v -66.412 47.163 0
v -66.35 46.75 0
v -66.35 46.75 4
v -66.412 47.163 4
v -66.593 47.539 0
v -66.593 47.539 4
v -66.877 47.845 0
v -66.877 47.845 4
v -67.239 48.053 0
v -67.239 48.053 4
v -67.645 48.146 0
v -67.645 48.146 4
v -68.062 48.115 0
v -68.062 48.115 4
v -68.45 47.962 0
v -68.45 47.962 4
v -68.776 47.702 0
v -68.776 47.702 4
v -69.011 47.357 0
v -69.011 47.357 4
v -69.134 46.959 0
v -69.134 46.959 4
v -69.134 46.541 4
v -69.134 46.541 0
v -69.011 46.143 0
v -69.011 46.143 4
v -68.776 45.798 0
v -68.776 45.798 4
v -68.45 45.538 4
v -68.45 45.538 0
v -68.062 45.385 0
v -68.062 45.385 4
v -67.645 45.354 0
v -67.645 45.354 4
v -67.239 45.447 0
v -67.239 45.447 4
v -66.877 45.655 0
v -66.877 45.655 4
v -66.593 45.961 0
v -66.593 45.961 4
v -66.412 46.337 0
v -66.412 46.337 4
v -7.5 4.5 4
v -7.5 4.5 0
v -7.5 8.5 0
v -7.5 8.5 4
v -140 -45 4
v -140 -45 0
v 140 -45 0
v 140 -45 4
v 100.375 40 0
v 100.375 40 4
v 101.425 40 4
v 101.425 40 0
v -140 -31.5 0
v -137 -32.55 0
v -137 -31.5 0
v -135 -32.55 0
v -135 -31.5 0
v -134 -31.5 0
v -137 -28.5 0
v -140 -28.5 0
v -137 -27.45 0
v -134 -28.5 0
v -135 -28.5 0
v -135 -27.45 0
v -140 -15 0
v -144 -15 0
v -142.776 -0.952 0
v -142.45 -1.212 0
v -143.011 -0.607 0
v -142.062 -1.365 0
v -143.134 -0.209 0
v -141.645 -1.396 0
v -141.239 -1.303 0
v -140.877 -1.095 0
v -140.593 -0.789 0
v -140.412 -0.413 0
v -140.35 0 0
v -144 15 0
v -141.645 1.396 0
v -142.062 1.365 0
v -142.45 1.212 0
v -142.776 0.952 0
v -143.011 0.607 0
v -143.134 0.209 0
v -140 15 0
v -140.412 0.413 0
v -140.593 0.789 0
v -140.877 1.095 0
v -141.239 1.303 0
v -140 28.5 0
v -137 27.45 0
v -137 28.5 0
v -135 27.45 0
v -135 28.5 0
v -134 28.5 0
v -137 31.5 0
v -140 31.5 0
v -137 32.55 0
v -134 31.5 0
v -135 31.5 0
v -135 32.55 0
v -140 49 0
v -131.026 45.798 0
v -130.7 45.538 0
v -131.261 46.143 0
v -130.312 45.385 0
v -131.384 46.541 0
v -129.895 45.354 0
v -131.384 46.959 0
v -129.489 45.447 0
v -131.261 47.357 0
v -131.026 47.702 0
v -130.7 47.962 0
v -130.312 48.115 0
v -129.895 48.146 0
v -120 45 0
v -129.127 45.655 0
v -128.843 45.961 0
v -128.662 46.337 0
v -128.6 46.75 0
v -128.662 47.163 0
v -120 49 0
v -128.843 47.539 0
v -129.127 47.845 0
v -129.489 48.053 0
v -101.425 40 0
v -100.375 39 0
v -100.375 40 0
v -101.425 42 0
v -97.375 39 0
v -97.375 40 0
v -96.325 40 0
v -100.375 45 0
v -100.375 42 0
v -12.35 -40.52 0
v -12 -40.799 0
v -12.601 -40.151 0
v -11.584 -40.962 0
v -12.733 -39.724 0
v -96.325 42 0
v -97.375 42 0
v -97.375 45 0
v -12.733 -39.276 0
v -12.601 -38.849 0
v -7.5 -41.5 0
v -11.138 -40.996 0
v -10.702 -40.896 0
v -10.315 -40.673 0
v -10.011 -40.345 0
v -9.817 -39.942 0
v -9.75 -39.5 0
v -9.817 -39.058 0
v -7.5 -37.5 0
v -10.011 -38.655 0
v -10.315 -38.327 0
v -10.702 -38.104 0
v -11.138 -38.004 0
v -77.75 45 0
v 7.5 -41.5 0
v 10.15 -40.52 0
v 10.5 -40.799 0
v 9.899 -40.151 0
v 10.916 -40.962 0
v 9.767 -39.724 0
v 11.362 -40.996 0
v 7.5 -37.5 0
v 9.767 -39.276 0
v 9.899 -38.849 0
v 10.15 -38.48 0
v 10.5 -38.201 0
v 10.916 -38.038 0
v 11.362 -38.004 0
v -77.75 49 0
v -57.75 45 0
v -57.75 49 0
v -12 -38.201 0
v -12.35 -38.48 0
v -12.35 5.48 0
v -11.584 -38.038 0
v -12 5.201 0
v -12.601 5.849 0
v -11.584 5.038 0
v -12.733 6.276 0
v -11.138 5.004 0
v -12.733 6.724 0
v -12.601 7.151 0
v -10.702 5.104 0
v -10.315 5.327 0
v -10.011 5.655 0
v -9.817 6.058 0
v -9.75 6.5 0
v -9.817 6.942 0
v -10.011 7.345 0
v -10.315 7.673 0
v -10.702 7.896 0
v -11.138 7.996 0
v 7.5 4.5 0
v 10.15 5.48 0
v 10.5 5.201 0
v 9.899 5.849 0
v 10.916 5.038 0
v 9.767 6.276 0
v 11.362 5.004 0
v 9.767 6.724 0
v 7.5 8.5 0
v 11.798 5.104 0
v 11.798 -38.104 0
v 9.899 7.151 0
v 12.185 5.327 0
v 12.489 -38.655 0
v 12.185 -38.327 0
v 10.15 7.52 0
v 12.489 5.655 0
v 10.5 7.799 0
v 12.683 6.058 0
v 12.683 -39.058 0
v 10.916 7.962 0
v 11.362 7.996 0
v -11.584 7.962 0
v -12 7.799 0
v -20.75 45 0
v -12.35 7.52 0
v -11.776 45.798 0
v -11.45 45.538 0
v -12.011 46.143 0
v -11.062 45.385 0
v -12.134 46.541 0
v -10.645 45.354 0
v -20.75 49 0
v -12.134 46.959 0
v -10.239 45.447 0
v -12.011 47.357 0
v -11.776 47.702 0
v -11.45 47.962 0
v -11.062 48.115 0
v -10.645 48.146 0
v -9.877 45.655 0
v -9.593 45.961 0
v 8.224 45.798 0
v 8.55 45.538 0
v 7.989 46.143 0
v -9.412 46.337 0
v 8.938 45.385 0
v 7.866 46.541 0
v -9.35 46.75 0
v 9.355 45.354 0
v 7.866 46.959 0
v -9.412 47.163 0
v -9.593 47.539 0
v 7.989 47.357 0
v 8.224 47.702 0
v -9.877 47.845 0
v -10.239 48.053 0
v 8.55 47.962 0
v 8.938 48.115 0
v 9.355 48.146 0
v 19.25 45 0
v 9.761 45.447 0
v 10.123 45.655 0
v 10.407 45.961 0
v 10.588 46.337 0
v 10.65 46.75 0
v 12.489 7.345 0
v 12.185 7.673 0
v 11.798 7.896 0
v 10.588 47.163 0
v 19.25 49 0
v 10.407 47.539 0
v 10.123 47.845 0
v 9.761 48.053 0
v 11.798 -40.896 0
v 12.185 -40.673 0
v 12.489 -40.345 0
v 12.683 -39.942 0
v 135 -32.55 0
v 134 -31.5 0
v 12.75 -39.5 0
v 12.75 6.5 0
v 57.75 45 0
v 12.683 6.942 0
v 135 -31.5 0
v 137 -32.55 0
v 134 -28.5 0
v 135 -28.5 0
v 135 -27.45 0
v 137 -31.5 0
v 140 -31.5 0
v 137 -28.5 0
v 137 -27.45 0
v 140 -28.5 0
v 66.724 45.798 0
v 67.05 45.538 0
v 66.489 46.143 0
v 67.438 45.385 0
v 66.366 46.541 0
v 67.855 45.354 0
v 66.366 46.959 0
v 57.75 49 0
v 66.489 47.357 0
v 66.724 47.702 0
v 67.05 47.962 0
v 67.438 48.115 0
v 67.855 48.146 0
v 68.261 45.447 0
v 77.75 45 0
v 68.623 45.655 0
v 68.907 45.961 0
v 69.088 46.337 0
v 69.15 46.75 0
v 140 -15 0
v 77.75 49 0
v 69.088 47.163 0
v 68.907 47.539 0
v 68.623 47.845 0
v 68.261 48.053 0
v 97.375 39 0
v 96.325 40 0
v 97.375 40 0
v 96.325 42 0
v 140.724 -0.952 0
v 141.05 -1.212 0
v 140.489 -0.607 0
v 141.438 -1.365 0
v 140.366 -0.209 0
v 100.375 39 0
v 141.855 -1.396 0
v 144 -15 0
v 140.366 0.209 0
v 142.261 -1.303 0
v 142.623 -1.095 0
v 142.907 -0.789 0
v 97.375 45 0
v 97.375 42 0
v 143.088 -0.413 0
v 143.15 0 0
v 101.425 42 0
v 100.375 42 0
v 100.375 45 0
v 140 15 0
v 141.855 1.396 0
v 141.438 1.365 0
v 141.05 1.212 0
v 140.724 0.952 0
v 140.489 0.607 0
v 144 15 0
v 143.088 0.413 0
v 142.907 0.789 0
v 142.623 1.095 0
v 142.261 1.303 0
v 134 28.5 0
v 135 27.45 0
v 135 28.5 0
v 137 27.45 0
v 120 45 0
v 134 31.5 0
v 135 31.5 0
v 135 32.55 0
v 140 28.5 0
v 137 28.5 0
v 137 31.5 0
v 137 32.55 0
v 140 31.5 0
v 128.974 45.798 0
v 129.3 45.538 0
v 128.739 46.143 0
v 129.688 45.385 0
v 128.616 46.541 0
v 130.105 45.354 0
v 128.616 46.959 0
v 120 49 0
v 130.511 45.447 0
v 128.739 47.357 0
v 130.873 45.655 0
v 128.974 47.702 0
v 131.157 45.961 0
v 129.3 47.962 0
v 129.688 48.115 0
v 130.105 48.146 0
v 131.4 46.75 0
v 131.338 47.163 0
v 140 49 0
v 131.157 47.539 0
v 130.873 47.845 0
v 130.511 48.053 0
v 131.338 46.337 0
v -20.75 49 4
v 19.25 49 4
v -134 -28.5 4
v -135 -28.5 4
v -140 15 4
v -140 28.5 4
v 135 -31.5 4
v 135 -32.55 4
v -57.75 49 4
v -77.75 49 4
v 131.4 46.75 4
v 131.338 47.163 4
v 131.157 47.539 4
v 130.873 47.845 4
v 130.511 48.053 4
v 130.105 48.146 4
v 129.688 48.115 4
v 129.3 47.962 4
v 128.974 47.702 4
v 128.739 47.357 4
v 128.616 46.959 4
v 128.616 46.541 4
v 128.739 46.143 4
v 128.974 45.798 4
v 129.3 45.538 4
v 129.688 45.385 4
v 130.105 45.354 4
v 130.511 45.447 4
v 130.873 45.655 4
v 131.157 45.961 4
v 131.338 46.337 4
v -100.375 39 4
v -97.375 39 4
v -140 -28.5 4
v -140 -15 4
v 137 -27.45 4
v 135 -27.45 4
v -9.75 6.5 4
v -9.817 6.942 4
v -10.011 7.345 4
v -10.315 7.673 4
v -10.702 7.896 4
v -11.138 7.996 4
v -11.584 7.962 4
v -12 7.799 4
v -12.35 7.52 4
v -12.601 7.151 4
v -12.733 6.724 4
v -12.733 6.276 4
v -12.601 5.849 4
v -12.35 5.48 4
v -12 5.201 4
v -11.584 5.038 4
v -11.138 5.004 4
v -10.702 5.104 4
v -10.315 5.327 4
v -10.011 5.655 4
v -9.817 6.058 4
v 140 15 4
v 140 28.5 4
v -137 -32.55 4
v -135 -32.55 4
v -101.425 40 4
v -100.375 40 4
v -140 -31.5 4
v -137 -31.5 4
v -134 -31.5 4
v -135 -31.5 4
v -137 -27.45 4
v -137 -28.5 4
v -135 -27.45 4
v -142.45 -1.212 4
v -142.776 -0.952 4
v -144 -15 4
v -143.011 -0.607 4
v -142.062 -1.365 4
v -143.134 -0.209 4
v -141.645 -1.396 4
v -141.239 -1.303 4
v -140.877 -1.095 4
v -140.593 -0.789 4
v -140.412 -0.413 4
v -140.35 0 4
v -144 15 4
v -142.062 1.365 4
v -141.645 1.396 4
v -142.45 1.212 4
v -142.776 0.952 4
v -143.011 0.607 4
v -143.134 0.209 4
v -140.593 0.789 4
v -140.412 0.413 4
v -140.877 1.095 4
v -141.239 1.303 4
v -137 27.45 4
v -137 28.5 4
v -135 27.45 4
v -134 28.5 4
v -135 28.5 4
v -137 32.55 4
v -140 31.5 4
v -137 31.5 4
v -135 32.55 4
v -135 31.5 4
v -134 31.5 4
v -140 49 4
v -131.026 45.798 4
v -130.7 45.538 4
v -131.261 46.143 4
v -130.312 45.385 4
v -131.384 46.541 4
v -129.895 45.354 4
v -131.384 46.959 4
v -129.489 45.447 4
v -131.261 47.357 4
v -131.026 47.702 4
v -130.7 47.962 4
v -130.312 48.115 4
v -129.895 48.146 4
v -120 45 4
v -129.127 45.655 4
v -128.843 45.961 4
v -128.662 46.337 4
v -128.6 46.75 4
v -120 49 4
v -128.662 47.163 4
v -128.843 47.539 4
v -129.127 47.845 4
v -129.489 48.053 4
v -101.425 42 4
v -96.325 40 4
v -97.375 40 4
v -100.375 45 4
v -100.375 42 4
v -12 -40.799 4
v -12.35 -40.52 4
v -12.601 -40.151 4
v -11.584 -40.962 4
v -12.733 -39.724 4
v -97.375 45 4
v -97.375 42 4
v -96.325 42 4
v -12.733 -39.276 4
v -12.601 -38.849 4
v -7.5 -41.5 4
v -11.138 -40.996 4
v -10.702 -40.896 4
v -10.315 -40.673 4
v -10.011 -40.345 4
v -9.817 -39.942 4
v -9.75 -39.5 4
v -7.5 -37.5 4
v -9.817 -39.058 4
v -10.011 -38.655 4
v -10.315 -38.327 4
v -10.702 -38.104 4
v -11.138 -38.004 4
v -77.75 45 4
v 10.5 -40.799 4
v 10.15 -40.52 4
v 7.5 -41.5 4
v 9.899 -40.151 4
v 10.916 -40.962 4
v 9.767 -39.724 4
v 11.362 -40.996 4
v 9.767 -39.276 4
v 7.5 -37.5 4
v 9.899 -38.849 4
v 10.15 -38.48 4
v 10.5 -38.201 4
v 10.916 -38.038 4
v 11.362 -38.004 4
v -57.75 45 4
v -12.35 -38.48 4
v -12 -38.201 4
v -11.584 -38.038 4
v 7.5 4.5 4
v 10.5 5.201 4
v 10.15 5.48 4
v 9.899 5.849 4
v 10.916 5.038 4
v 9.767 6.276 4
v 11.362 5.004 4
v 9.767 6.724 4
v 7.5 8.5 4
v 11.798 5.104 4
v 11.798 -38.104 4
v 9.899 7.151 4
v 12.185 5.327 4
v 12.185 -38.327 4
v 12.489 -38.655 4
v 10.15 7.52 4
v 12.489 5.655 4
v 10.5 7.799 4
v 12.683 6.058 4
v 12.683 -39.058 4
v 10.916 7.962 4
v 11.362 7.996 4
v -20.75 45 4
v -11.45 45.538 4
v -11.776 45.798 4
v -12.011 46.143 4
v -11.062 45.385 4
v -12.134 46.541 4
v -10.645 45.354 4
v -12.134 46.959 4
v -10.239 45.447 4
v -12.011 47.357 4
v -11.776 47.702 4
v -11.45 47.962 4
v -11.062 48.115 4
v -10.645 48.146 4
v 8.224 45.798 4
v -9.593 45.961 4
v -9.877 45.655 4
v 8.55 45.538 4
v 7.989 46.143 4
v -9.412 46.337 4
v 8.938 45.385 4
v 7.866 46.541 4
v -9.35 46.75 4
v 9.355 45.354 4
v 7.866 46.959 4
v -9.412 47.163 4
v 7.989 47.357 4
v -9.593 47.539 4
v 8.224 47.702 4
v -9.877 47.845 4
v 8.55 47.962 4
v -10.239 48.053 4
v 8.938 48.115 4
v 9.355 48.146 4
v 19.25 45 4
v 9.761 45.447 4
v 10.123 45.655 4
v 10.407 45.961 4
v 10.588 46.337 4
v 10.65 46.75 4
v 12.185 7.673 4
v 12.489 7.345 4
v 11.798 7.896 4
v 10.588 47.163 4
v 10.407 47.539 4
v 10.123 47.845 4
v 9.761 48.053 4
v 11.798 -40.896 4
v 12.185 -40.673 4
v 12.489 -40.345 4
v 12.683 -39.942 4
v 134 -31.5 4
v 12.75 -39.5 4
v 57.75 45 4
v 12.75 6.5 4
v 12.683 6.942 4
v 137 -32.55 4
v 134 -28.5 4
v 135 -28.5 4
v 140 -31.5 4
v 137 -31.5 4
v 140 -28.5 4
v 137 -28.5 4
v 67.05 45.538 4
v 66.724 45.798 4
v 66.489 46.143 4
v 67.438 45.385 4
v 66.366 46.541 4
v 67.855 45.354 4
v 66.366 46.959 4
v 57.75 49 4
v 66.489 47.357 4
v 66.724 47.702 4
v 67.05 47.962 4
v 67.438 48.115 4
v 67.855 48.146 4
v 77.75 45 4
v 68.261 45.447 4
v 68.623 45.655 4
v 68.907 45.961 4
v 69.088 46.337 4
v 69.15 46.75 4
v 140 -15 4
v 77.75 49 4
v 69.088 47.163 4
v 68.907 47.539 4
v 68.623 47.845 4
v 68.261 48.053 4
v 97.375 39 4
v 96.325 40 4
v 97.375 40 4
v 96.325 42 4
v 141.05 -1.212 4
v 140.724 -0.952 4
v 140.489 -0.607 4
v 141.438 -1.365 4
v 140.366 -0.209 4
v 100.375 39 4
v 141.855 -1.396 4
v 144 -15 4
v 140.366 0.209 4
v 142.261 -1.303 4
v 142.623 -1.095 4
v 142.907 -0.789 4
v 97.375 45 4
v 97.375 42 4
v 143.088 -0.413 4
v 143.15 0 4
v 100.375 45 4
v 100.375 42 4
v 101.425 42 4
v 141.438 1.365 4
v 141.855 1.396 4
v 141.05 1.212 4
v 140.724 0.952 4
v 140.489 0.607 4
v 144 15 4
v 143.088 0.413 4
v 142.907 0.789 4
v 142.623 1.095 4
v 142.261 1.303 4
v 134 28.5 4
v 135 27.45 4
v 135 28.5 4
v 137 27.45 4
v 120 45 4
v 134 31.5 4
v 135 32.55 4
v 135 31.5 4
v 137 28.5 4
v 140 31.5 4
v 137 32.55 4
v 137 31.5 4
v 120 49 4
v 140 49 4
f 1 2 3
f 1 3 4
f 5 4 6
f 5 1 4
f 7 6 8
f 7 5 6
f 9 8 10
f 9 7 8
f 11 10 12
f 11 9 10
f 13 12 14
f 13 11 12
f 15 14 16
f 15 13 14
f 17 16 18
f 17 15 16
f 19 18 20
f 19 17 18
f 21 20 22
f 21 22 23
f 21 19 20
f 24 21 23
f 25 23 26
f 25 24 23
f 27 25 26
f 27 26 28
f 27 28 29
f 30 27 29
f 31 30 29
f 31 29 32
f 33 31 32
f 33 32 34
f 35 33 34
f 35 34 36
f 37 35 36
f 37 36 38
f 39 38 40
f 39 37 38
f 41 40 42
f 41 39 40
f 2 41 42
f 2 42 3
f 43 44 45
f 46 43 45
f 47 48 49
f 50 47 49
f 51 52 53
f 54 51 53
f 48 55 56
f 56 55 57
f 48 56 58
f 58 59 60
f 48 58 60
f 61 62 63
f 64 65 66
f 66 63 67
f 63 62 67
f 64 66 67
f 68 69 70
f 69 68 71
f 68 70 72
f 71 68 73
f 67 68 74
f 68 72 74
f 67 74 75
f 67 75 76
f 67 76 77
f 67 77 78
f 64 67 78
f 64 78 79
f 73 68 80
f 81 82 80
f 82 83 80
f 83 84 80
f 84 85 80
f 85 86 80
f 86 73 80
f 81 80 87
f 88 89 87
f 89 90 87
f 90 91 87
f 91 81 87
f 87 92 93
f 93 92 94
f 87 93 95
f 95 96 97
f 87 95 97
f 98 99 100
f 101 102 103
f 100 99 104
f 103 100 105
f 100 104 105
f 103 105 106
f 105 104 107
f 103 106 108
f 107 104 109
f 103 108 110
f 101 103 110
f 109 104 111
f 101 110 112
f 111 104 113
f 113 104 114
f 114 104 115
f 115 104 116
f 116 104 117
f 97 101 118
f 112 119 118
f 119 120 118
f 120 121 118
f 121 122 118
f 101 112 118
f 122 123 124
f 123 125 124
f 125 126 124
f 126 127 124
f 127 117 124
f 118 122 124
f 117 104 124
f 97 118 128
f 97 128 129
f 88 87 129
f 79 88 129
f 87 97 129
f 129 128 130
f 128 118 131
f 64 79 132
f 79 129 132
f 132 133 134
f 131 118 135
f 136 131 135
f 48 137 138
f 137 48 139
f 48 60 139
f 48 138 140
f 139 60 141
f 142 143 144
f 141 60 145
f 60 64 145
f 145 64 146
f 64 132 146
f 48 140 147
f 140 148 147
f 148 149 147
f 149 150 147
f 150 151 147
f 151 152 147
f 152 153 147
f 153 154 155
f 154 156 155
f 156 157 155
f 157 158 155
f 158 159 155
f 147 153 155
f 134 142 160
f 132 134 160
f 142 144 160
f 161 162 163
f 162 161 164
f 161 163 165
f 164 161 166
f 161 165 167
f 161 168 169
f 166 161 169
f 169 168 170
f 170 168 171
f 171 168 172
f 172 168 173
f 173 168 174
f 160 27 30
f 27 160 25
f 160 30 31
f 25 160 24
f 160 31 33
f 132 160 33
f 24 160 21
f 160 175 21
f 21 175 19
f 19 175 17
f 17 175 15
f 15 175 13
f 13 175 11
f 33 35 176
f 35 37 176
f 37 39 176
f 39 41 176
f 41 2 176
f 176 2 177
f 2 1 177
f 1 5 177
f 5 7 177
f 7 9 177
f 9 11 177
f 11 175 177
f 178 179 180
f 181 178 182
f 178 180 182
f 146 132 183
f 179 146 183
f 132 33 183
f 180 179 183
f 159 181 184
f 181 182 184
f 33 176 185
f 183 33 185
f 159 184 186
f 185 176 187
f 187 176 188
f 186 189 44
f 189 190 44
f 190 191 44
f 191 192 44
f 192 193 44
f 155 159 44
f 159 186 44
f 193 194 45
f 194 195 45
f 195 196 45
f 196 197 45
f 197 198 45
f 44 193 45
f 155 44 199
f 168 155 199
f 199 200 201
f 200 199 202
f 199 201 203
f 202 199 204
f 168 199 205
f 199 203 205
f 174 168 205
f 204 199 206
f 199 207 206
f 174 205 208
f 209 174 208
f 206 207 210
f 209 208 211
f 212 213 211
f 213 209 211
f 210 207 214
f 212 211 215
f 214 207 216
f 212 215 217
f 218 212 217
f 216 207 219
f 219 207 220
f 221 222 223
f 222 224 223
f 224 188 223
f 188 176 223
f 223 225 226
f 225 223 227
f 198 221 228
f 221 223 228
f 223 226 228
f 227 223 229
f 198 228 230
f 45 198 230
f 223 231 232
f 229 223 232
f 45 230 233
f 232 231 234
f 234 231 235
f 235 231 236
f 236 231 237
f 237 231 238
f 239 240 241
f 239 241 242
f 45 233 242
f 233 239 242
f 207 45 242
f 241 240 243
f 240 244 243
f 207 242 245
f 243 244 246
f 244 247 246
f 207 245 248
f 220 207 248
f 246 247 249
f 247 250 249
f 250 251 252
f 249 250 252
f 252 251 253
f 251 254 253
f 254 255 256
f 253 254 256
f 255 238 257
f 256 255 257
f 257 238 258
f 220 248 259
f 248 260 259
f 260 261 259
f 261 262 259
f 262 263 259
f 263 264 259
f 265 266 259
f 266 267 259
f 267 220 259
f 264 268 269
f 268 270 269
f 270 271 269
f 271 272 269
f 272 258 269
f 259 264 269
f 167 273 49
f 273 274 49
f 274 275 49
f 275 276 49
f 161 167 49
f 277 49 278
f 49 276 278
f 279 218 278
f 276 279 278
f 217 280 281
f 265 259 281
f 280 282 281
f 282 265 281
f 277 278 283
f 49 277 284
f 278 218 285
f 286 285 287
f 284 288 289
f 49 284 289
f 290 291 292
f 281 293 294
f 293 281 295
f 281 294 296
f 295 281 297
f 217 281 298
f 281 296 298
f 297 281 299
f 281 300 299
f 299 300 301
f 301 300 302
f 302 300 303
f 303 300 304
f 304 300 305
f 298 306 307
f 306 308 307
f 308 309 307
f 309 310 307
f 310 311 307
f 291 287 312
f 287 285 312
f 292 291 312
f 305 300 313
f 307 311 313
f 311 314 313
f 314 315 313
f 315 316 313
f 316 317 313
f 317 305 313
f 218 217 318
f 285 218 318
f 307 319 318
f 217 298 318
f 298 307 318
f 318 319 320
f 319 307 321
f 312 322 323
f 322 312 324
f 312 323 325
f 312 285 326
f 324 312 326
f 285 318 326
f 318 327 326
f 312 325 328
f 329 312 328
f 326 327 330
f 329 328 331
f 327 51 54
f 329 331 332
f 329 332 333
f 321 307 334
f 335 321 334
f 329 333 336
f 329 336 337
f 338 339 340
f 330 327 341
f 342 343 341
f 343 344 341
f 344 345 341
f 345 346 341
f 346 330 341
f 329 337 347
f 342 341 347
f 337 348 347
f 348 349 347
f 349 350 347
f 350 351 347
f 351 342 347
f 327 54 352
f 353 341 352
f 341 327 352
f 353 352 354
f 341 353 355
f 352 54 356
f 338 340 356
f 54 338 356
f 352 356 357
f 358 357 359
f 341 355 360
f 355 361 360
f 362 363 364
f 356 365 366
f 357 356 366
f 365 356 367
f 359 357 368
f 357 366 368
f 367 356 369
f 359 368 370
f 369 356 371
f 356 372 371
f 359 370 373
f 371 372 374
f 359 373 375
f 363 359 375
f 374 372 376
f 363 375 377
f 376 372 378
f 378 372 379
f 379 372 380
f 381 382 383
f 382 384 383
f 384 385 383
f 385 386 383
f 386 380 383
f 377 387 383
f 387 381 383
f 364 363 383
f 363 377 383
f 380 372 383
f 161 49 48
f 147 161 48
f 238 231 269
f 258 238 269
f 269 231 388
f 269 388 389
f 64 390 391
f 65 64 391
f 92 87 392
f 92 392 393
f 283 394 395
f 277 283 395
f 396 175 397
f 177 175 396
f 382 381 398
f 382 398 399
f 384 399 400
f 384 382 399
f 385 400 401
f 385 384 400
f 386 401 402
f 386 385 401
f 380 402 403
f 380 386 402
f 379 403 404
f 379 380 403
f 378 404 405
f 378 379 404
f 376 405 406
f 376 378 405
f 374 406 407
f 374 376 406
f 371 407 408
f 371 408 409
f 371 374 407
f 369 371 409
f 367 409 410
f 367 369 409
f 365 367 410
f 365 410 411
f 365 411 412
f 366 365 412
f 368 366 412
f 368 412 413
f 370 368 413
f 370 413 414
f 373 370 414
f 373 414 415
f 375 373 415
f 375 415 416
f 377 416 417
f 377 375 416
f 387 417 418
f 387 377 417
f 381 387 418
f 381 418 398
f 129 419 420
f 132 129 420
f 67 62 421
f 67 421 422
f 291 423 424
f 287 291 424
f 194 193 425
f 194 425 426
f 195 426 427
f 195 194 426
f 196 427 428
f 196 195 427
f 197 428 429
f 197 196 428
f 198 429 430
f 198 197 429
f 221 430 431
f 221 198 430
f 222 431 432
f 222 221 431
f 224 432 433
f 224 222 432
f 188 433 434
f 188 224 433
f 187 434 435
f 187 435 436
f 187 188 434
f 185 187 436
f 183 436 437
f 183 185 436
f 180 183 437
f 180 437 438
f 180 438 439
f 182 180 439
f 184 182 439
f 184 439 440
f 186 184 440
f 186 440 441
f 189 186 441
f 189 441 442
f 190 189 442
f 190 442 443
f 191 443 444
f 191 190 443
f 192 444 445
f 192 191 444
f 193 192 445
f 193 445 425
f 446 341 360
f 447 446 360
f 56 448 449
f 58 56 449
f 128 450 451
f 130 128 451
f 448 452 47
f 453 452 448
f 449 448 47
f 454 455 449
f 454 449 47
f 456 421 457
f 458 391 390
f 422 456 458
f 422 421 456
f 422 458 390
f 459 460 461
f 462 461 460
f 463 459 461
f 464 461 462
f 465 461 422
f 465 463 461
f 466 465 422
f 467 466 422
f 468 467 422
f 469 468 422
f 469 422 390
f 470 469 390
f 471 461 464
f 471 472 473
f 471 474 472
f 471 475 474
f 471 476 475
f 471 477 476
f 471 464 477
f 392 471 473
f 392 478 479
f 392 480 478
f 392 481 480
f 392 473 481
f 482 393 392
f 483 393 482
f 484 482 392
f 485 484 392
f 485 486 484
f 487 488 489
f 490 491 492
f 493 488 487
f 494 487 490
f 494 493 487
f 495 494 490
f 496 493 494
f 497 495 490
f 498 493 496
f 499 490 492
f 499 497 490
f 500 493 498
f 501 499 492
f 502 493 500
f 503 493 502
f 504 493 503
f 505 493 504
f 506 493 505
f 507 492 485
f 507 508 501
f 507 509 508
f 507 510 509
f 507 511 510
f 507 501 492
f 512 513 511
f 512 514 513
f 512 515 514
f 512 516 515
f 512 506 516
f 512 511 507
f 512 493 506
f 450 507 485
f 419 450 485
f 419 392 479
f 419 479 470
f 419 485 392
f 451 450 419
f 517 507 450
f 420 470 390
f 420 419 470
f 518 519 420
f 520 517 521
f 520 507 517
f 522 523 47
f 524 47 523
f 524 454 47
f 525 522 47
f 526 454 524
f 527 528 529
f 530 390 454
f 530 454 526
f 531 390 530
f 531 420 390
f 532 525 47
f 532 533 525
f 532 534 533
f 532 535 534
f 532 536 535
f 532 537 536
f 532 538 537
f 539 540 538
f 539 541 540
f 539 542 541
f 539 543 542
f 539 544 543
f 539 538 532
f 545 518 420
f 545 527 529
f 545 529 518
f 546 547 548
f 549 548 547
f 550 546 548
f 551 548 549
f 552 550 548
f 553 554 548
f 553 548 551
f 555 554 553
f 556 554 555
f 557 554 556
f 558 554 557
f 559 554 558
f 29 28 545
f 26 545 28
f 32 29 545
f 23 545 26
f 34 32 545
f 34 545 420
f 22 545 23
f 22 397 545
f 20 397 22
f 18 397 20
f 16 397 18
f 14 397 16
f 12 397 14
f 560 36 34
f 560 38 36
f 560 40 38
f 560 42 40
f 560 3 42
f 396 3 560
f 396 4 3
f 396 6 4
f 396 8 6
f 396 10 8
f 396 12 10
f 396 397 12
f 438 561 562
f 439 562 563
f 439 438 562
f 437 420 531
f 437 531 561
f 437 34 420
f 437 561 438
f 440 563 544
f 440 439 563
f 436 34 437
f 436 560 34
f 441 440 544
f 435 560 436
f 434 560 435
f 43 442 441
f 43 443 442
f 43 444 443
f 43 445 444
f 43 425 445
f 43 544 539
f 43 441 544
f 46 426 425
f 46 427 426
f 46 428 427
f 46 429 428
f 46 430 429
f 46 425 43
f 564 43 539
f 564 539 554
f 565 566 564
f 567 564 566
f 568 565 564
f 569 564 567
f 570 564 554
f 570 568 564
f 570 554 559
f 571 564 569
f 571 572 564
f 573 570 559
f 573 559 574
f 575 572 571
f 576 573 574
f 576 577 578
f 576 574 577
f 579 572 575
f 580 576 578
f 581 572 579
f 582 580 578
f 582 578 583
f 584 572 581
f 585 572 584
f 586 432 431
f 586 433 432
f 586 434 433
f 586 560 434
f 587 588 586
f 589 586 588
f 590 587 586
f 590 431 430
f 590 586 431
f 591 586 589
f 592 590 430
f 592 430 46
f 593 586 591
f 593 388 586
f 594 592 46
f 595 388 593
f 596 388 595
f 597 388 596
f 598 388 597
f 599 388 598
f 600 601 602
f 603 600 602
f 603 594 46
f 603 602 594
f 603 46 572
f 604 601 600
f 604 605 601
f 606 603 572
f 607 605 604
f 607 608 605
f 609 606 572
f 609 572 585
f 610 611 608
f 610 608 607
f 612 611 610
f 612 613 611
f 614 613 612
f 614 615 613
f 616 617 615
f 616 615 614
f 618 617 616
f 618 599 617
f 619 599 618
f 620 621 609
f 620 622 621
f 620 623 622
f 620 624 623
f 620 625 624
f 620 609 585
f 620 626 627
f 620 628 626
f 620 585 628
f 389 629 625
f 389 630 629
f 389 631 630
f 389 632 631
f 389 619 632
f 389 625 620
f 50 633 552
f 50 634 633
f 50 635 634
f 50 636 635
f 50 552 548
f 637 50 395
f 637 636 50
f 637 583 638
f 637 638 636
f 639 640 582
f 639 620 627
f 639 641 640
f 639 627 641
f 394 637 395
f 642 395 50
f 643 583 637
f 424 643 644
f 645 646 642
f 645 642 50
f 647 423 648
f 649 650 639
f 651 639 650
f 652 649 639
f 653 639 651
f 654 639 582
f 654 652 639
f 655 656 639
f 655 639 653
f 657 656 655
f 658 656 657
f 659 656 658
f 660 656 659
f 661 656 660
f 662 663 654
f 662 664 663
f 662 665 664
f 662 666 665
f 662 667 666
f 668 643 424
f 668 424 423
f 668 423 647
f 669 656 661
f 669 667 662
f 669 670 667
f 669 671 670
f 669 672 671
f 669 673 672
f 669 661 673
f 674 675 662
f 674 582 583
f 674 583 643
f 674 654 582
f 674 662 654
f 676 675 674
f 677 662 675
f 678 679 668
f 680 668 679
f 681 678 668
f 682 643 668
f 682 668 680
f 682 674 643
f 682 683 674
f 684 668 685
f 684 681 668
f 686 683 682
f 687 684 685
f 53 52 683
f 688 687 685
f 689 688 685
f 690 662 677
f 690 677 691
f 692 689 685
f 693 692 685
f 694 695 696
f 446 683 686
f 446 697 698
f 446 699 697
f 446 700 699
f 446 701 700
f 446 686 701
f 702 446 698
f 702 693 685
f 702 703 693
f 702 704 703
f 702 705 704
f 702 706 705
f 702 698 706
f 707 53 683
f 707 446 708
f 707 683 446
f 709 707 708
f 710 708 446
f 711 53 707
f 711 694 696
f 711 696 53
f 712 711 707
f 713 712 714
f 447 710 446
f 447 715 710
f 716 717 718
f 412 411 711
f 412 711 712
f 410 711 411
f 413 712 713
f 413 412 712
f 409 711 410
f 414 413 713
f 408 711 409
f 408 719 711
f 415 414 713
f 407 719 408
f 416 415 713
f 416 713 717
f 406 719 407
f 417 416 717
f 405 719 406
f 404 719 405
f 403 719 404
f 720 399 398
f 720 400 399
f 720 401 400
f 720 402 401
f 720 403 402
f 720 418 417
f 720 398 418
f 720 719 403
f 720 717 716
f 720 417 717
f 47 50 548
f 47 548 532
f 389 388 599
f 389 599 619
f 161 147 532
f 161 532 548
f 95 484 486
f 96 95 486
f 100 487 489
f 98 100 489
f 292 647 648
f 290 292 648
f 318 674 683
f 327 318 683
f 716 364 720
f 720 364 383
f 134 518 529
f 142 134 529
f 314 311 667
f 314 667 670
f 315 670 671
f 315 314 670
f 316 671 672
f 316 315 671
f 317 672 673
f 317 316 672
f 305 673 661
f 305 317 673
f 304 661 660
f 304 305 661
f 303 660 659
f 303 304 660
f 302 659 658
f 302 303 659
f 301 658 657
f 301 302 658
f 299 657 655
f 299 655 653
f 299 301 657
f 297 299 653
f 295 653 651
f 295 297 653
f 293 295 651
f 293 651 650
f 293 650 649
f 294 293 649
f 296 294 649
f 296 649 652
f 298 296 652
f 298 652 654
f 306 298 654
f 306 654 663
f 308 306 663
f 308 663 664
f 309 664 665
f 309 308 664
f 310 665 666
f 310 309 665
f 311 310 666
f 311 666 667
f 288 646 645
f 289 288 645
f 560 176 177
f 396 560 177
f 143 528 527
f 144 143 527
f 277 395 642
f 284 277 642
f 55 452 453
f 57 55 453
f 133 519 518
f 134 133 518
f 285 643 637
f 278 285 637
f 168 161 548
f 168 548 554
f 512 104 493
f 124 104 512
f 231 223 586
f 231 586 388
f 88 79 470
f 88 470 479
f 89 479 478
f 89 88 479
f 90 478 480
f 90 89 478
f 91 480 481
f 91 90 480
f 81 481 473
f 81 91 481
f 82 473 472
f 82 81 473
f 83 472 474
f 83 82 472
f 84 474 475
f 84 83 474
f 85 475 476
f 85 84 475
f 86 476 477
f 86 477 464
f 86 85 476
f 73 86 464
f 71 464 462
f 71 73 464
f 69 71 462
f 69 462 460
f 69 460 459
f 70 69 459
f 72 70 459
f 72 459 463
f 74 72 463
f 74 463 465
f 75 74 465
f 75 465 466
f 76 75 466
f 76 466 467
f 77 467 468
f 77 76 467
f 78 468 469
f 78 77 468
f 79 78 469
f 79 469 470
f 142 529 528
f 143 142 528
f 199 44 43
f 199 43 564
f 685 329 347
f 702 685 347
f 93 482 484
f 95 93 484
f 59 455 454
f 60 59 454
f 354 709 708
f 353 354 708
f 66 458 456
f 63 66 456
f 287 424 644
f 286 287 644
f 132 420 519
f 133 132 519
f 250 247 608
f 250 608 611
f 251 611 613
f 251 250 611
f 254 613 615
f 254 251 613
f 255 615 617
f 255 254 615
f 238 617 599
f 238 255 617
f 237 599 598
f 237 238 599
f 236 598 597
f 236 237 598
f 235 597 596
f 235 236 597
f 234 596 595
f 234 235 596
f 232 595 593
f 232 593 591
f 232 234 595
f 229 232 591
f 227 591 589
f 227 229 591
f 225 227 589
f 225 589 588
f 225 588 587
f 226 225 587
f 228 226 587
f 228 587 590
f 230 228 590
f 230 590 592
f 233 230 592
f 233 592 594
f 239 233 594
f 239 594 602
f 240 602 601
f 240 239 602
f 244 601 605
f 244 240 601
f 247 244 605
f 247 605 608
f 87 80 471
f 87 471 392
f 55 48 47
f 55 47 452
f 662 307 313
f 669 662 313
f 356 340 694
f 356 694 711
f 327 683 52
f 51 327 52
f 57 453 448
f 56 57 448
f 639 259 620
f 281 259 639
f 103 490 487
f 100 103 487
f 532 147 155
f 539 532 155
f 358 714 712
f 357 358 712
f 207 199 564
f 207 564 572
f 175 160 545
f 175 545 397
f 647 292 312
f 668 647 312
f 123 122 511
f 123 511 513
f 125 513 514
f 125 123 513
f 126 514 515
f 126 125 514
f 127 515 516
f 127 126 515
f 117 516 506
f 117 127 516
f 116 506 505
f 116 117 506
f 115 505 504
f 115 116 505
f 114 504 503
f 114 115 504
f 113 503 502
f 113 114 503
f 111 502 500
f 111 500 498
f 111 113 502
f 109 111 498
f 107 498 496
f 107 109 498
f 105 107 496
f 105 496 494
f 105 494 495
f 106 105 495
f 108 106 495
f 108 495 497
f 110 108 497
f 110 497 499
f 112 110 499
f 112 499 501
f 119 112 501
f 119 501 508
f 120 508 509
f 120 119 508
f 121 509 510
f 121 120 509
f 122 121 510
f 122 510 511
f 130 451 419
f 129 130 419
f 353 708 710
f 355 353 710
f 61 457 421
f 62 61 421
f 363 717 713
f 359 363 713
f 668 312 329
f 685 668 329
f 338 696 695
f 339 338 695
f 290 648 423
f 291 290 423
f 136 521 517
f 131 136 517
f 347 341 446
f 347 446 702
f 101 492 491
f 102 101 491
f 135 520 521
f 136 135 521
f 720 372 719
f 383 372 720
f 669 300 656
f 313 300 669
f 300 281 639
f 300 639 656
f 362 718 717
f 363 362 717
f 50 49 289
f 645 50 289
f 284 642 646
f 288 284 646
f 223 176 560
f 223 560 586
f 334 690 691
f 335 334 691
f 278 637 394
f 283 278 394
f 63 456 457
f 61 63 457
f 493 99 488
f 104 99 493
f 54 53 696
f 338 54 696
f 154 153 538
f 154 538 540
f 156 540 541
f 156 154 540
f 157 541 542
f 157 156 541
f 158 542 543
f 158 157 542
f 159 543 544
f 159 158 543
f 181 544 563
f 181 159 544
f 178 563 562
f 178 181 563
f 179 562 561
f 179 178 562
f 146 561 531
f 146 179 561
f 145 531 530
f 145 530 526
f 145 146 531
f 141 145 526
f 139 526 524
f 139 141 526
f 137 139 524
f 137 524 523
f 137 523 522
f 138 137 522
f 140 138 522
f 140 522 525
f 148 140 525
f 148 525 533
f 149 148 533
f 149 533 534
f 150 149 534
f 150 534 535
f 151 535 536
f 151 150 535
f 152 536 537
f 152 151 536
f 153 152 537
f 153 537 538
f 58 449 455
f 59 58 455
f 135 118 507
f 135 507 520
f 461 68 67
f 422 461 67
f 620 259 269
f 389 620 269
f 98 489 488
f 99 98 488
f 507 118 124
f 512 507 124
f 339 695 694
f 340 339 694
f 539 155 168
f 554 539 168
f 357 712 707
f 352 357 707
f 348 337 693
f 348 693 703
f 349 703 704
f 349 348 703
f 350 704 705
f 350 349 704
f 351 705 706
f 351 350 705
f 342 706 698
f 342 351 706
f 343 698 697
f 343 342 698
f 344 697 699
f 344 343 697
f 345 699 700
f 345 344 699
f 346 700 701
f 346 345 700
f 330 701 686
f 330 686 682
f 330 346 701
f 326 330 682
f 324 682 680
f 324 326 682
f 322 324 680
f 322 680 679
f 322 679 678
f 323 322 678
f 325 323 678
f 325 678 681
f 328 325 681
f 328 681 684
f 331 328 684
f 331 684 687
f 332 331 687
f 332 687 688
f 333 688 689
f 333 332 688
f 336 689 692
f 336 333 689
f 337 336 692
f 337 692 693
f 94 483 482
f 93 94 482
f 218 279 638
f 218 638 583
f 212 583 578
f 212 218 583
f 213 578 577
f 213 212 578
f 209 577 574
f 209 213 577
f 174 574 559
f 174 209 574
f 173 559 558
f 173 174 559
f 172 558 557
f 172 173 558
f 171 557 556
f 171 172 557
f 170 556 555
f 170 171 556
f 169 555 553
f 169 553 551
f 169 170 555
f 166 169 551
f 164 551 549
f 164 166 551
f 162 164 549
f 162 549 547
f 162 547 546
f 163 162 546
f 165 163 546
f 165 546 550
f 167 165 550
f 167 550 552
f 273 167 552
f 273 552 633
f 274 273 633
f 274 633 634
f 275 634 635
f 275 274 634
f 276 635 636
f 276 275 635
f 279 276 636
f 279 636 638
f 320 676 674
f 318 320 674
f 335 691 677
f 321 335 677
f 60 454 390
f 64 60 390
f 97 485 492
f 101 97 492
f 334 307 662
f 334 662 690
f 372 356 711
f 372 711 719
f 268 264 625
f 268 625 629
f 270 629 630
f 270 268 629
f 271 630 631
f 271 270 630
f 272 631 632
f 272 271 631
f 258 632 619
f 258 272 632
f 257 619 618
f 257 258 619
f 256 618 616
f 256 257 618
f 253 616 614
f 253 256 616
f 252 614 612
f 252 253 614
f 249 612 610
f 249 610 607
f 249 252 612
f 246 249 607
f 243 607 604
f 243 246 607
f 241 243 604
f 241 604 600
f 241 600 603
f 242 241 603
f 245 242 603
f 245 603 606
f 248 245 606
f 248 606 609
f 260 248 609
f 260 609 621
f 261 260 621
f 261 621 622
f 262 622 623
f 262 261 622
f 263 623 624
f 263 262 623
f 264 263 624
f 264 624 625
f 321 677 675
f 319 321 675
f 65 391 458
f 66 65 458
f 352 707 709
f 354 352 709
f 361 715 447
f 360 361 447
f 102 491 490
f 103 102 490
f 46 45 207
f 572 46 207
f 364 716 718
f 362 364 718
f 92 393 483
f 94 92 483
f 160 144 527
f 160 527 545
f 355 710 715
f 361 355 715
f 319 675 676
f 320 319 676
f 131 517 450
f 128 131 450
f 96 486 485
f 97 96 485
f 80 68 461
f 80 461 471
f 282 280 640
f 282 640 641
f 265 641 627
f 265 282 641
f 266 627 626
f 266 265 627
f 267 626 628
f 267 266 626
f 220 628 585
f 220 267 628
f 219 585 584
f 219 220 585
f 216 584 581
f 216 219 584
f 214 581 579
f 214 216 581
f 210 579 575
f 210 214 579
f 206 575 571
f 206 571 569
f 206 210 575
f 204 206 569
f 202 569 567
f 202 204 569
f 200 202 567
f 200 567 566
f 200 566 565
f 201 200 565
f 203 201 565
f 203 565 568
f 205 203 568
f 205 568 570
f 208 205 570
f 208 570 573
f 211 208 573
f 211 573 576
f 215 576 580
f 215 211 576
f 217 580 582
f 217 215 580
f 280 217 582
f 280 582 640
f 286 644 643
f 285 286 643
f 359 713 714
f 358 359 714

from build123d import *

# Parameters (mm, degrees)
SKETCH_1_W          = 280
SKETCH_1_H          = 90
SKETCH_1_R          = 1.5
SKETCH_1_W_2        = 15
SKETCH_1_H_2        = 4
EXTRUDE_1_DEPTH     = 4
SKETCH_2_W          = 4
SKETCH_2_H          = 30
SKETCH_2_R          = 1.4
SKETCH_2_W_2        = 20
SKETCH_2_H_2        = 4
SKETCH_2_W_3        = 40
EXTRUDE_7_DEPTH     = 4
CUT_EXTRUDE_1_DEPTH = 153.161098839


with BuildPart() as part:
    # Эскиз1 → Бобышка-Вытянуть1 (new body)
    with BuildSketch(Plane.XY):
        Rectangle(SKETCH_1_W, SKETCH_1_H)
        with Locations((11.25, 6.5)):
            Circle(SKETCH_1_R, mode=Mode.SUBTRACT)
        with Locations((-11.25, 6.5)):
            Circle(SKETCH_1_R, mode=Mode.SUBTRACT)
        with Locations((-11.25, -39.5)):
            Circle(SKETCH_1_R, mode=Mode.SUBTRACT)
        with Locations((11.25, -39.5)):
            Circle(SKETCH_1_R, mode=Mode.SUBTRACT)
        with Locations((0, -39.5)):
            Rectangle(SKETCH_1_W_2, SKETCH_1_H_2, mode=Mode.SUBTRACT)
        with Locations((0, 6.5)):
            Rectangle(SKETCH_1_W_2, SKETCH_1_H_2, mode=Mode.SUBTRACT)
    extrude(amount=EXTRUDE_1_DEPTH)

    # Эскиз2 → Бобышка-Вытянуть7 (add, through all)
    # profile 1 of 7: a face of its own
    with BuildSketch(Plane.XY):
        with Locations((-142, 0)):
            Rectangle(SKETCH_2_W, SKETCH_2_H)
        with Locations((-141.75, 0)):
            Circle(SKETCH_2_R, mode=Mode.SUBTRACT)
    # profile 2 of 7: a face of its own
    with BuildSketch(Plane.XY):
        with Locations((-130, 47)):
            Rectangle(SKETCH_2_W_2, SKETCH_2_H_2)
        with Locations((-130, 46.75)):
            Circle(SKETCH_2_R, mode=Mode.SUBTRACT)
    # profile 3 of 7: a face of its own
    with BuildSketch(Plane.XY):
        with Locations((-0.75, 47)):
            Rectangle(SKETCH_2_W_3, SKETCH_2_H_2)
        with Locations((9.25, 46.75)):
            Circle(SKETCH_2_R, mode=Mode.SUBTRACT)
        with Locations((-10.75, 46.75)):
            Circle(SKETCH_2_R, mode=Mode.SUBTRACT)
    # profile 4 of 7: a face of its own
    with BuildSketch(Plane.XY):
        with Locations((130, 47)):
            Rectangle(SKETCH_2_W_2, SKETCH_2_H_2)
        with Locations((130, 46.75)):
            Circle(SKETCH_2_R, mode=Mode.SUBTRACT)
    # profile 5 of 7: a face of its own
    with BuildSketch(Plane.XY):
        with Locations((142, 0)):
            Rectangle(SKETCH_2_W, SKETCH_2_H)
        with Locations((141.75, 0)):
            Circle(SKETCH_2_R, mode=Mode.SUBTRACT)
    # profile 6 of 7: a face of its own
    with BuildSketch(Plane.XY):
        with Locations((-67.75, 47)):
            Rectangle(SKETCH_2_W_2, SKETCH_2_H_2)
        with Locations((-67.75, 46.75)):
            Circle(SKETCH_2_R, mode=Mode.SUBTRACT)
    # profile 7 of 7: a face of its own
    with BuildSketch(Plane.XY):
        with Locations((67.75, 47)):
            Rectangle(SKETCH_2_W_2, SKETCH_2_H_2)
        with Locations((67.75, 46.75)):
            Circle(SKETCH_2_R, mode=Mode.SUBTRACT)
    extrude(amount=EXTRUDE_7_DEPTH)

    # Эскиз3 → Вырез-Вытянуть1 (cut, through all)
    with BuildSketch(Plane.XY.offset(4)):
        Polygon((97.375, 42), (96.325, 42), (96.325, 40), (97.375, 40), (97.375, 39), (100.375, 39), (100.375, 40), (101.425, 40), (101.425, 42), (100.375, 42), (100.375, 45), (97.375, 45), align=None)
        Polygon((-97.375, 45), (-100.375, 45), (-100.375, 42), (-101.425, 42), (-101.425, 40), (-100.375, 40), (-100.375, 39), (-97.375, 39), (-97.375, 40), (-96.325, 40), (-96.325, 42), (-97.375, 42), align=None)
        Polygon((-137, 31.5), (-140, 31.5), (-140, 28.5), (-137, 28.5), (-137, 27.45), (-135, 27.45), (-135, 28.5), (-134, 28.5), (-134, 31.5), (-135, 31.5), (-135, 32.55), (-137, 32.55), align=None)
        Polygon((-137, -32.55), (-135, -32.55), (-135, -31.5), (-134, -31.5), (-134, -28.5), (-135, -28.5), (-135, -27.45), (-137, -27.45), (-137, -28.5), (-140, -28.5), (-140, -31.5), (-137, -31.5), align=None)
        Polygon((137, -31.5), (140, -31.5), (140, -28.5), (137, -28.5), (137, -27.45), (135, -27.45), (135, -28.5), (134, -28.5), (134, -31.5), (135, -31.5), (135, -32.55), (137, -32.55), align=None)
        Polygon((137, 32.55), (135, 32.55), (135, 31.5), (134, 31.5), (134, 28.5), (135, 28.5), (135, 27.45), (137, 27.45), (137, 28.5), (140, 28.5), (140, 31.5), (137, 31.5), align=None)
    extrude(amount=-CUT_EXTRUDE_1_DEPTH, mode=Mode.SUBTRACT)


solid = part.part
